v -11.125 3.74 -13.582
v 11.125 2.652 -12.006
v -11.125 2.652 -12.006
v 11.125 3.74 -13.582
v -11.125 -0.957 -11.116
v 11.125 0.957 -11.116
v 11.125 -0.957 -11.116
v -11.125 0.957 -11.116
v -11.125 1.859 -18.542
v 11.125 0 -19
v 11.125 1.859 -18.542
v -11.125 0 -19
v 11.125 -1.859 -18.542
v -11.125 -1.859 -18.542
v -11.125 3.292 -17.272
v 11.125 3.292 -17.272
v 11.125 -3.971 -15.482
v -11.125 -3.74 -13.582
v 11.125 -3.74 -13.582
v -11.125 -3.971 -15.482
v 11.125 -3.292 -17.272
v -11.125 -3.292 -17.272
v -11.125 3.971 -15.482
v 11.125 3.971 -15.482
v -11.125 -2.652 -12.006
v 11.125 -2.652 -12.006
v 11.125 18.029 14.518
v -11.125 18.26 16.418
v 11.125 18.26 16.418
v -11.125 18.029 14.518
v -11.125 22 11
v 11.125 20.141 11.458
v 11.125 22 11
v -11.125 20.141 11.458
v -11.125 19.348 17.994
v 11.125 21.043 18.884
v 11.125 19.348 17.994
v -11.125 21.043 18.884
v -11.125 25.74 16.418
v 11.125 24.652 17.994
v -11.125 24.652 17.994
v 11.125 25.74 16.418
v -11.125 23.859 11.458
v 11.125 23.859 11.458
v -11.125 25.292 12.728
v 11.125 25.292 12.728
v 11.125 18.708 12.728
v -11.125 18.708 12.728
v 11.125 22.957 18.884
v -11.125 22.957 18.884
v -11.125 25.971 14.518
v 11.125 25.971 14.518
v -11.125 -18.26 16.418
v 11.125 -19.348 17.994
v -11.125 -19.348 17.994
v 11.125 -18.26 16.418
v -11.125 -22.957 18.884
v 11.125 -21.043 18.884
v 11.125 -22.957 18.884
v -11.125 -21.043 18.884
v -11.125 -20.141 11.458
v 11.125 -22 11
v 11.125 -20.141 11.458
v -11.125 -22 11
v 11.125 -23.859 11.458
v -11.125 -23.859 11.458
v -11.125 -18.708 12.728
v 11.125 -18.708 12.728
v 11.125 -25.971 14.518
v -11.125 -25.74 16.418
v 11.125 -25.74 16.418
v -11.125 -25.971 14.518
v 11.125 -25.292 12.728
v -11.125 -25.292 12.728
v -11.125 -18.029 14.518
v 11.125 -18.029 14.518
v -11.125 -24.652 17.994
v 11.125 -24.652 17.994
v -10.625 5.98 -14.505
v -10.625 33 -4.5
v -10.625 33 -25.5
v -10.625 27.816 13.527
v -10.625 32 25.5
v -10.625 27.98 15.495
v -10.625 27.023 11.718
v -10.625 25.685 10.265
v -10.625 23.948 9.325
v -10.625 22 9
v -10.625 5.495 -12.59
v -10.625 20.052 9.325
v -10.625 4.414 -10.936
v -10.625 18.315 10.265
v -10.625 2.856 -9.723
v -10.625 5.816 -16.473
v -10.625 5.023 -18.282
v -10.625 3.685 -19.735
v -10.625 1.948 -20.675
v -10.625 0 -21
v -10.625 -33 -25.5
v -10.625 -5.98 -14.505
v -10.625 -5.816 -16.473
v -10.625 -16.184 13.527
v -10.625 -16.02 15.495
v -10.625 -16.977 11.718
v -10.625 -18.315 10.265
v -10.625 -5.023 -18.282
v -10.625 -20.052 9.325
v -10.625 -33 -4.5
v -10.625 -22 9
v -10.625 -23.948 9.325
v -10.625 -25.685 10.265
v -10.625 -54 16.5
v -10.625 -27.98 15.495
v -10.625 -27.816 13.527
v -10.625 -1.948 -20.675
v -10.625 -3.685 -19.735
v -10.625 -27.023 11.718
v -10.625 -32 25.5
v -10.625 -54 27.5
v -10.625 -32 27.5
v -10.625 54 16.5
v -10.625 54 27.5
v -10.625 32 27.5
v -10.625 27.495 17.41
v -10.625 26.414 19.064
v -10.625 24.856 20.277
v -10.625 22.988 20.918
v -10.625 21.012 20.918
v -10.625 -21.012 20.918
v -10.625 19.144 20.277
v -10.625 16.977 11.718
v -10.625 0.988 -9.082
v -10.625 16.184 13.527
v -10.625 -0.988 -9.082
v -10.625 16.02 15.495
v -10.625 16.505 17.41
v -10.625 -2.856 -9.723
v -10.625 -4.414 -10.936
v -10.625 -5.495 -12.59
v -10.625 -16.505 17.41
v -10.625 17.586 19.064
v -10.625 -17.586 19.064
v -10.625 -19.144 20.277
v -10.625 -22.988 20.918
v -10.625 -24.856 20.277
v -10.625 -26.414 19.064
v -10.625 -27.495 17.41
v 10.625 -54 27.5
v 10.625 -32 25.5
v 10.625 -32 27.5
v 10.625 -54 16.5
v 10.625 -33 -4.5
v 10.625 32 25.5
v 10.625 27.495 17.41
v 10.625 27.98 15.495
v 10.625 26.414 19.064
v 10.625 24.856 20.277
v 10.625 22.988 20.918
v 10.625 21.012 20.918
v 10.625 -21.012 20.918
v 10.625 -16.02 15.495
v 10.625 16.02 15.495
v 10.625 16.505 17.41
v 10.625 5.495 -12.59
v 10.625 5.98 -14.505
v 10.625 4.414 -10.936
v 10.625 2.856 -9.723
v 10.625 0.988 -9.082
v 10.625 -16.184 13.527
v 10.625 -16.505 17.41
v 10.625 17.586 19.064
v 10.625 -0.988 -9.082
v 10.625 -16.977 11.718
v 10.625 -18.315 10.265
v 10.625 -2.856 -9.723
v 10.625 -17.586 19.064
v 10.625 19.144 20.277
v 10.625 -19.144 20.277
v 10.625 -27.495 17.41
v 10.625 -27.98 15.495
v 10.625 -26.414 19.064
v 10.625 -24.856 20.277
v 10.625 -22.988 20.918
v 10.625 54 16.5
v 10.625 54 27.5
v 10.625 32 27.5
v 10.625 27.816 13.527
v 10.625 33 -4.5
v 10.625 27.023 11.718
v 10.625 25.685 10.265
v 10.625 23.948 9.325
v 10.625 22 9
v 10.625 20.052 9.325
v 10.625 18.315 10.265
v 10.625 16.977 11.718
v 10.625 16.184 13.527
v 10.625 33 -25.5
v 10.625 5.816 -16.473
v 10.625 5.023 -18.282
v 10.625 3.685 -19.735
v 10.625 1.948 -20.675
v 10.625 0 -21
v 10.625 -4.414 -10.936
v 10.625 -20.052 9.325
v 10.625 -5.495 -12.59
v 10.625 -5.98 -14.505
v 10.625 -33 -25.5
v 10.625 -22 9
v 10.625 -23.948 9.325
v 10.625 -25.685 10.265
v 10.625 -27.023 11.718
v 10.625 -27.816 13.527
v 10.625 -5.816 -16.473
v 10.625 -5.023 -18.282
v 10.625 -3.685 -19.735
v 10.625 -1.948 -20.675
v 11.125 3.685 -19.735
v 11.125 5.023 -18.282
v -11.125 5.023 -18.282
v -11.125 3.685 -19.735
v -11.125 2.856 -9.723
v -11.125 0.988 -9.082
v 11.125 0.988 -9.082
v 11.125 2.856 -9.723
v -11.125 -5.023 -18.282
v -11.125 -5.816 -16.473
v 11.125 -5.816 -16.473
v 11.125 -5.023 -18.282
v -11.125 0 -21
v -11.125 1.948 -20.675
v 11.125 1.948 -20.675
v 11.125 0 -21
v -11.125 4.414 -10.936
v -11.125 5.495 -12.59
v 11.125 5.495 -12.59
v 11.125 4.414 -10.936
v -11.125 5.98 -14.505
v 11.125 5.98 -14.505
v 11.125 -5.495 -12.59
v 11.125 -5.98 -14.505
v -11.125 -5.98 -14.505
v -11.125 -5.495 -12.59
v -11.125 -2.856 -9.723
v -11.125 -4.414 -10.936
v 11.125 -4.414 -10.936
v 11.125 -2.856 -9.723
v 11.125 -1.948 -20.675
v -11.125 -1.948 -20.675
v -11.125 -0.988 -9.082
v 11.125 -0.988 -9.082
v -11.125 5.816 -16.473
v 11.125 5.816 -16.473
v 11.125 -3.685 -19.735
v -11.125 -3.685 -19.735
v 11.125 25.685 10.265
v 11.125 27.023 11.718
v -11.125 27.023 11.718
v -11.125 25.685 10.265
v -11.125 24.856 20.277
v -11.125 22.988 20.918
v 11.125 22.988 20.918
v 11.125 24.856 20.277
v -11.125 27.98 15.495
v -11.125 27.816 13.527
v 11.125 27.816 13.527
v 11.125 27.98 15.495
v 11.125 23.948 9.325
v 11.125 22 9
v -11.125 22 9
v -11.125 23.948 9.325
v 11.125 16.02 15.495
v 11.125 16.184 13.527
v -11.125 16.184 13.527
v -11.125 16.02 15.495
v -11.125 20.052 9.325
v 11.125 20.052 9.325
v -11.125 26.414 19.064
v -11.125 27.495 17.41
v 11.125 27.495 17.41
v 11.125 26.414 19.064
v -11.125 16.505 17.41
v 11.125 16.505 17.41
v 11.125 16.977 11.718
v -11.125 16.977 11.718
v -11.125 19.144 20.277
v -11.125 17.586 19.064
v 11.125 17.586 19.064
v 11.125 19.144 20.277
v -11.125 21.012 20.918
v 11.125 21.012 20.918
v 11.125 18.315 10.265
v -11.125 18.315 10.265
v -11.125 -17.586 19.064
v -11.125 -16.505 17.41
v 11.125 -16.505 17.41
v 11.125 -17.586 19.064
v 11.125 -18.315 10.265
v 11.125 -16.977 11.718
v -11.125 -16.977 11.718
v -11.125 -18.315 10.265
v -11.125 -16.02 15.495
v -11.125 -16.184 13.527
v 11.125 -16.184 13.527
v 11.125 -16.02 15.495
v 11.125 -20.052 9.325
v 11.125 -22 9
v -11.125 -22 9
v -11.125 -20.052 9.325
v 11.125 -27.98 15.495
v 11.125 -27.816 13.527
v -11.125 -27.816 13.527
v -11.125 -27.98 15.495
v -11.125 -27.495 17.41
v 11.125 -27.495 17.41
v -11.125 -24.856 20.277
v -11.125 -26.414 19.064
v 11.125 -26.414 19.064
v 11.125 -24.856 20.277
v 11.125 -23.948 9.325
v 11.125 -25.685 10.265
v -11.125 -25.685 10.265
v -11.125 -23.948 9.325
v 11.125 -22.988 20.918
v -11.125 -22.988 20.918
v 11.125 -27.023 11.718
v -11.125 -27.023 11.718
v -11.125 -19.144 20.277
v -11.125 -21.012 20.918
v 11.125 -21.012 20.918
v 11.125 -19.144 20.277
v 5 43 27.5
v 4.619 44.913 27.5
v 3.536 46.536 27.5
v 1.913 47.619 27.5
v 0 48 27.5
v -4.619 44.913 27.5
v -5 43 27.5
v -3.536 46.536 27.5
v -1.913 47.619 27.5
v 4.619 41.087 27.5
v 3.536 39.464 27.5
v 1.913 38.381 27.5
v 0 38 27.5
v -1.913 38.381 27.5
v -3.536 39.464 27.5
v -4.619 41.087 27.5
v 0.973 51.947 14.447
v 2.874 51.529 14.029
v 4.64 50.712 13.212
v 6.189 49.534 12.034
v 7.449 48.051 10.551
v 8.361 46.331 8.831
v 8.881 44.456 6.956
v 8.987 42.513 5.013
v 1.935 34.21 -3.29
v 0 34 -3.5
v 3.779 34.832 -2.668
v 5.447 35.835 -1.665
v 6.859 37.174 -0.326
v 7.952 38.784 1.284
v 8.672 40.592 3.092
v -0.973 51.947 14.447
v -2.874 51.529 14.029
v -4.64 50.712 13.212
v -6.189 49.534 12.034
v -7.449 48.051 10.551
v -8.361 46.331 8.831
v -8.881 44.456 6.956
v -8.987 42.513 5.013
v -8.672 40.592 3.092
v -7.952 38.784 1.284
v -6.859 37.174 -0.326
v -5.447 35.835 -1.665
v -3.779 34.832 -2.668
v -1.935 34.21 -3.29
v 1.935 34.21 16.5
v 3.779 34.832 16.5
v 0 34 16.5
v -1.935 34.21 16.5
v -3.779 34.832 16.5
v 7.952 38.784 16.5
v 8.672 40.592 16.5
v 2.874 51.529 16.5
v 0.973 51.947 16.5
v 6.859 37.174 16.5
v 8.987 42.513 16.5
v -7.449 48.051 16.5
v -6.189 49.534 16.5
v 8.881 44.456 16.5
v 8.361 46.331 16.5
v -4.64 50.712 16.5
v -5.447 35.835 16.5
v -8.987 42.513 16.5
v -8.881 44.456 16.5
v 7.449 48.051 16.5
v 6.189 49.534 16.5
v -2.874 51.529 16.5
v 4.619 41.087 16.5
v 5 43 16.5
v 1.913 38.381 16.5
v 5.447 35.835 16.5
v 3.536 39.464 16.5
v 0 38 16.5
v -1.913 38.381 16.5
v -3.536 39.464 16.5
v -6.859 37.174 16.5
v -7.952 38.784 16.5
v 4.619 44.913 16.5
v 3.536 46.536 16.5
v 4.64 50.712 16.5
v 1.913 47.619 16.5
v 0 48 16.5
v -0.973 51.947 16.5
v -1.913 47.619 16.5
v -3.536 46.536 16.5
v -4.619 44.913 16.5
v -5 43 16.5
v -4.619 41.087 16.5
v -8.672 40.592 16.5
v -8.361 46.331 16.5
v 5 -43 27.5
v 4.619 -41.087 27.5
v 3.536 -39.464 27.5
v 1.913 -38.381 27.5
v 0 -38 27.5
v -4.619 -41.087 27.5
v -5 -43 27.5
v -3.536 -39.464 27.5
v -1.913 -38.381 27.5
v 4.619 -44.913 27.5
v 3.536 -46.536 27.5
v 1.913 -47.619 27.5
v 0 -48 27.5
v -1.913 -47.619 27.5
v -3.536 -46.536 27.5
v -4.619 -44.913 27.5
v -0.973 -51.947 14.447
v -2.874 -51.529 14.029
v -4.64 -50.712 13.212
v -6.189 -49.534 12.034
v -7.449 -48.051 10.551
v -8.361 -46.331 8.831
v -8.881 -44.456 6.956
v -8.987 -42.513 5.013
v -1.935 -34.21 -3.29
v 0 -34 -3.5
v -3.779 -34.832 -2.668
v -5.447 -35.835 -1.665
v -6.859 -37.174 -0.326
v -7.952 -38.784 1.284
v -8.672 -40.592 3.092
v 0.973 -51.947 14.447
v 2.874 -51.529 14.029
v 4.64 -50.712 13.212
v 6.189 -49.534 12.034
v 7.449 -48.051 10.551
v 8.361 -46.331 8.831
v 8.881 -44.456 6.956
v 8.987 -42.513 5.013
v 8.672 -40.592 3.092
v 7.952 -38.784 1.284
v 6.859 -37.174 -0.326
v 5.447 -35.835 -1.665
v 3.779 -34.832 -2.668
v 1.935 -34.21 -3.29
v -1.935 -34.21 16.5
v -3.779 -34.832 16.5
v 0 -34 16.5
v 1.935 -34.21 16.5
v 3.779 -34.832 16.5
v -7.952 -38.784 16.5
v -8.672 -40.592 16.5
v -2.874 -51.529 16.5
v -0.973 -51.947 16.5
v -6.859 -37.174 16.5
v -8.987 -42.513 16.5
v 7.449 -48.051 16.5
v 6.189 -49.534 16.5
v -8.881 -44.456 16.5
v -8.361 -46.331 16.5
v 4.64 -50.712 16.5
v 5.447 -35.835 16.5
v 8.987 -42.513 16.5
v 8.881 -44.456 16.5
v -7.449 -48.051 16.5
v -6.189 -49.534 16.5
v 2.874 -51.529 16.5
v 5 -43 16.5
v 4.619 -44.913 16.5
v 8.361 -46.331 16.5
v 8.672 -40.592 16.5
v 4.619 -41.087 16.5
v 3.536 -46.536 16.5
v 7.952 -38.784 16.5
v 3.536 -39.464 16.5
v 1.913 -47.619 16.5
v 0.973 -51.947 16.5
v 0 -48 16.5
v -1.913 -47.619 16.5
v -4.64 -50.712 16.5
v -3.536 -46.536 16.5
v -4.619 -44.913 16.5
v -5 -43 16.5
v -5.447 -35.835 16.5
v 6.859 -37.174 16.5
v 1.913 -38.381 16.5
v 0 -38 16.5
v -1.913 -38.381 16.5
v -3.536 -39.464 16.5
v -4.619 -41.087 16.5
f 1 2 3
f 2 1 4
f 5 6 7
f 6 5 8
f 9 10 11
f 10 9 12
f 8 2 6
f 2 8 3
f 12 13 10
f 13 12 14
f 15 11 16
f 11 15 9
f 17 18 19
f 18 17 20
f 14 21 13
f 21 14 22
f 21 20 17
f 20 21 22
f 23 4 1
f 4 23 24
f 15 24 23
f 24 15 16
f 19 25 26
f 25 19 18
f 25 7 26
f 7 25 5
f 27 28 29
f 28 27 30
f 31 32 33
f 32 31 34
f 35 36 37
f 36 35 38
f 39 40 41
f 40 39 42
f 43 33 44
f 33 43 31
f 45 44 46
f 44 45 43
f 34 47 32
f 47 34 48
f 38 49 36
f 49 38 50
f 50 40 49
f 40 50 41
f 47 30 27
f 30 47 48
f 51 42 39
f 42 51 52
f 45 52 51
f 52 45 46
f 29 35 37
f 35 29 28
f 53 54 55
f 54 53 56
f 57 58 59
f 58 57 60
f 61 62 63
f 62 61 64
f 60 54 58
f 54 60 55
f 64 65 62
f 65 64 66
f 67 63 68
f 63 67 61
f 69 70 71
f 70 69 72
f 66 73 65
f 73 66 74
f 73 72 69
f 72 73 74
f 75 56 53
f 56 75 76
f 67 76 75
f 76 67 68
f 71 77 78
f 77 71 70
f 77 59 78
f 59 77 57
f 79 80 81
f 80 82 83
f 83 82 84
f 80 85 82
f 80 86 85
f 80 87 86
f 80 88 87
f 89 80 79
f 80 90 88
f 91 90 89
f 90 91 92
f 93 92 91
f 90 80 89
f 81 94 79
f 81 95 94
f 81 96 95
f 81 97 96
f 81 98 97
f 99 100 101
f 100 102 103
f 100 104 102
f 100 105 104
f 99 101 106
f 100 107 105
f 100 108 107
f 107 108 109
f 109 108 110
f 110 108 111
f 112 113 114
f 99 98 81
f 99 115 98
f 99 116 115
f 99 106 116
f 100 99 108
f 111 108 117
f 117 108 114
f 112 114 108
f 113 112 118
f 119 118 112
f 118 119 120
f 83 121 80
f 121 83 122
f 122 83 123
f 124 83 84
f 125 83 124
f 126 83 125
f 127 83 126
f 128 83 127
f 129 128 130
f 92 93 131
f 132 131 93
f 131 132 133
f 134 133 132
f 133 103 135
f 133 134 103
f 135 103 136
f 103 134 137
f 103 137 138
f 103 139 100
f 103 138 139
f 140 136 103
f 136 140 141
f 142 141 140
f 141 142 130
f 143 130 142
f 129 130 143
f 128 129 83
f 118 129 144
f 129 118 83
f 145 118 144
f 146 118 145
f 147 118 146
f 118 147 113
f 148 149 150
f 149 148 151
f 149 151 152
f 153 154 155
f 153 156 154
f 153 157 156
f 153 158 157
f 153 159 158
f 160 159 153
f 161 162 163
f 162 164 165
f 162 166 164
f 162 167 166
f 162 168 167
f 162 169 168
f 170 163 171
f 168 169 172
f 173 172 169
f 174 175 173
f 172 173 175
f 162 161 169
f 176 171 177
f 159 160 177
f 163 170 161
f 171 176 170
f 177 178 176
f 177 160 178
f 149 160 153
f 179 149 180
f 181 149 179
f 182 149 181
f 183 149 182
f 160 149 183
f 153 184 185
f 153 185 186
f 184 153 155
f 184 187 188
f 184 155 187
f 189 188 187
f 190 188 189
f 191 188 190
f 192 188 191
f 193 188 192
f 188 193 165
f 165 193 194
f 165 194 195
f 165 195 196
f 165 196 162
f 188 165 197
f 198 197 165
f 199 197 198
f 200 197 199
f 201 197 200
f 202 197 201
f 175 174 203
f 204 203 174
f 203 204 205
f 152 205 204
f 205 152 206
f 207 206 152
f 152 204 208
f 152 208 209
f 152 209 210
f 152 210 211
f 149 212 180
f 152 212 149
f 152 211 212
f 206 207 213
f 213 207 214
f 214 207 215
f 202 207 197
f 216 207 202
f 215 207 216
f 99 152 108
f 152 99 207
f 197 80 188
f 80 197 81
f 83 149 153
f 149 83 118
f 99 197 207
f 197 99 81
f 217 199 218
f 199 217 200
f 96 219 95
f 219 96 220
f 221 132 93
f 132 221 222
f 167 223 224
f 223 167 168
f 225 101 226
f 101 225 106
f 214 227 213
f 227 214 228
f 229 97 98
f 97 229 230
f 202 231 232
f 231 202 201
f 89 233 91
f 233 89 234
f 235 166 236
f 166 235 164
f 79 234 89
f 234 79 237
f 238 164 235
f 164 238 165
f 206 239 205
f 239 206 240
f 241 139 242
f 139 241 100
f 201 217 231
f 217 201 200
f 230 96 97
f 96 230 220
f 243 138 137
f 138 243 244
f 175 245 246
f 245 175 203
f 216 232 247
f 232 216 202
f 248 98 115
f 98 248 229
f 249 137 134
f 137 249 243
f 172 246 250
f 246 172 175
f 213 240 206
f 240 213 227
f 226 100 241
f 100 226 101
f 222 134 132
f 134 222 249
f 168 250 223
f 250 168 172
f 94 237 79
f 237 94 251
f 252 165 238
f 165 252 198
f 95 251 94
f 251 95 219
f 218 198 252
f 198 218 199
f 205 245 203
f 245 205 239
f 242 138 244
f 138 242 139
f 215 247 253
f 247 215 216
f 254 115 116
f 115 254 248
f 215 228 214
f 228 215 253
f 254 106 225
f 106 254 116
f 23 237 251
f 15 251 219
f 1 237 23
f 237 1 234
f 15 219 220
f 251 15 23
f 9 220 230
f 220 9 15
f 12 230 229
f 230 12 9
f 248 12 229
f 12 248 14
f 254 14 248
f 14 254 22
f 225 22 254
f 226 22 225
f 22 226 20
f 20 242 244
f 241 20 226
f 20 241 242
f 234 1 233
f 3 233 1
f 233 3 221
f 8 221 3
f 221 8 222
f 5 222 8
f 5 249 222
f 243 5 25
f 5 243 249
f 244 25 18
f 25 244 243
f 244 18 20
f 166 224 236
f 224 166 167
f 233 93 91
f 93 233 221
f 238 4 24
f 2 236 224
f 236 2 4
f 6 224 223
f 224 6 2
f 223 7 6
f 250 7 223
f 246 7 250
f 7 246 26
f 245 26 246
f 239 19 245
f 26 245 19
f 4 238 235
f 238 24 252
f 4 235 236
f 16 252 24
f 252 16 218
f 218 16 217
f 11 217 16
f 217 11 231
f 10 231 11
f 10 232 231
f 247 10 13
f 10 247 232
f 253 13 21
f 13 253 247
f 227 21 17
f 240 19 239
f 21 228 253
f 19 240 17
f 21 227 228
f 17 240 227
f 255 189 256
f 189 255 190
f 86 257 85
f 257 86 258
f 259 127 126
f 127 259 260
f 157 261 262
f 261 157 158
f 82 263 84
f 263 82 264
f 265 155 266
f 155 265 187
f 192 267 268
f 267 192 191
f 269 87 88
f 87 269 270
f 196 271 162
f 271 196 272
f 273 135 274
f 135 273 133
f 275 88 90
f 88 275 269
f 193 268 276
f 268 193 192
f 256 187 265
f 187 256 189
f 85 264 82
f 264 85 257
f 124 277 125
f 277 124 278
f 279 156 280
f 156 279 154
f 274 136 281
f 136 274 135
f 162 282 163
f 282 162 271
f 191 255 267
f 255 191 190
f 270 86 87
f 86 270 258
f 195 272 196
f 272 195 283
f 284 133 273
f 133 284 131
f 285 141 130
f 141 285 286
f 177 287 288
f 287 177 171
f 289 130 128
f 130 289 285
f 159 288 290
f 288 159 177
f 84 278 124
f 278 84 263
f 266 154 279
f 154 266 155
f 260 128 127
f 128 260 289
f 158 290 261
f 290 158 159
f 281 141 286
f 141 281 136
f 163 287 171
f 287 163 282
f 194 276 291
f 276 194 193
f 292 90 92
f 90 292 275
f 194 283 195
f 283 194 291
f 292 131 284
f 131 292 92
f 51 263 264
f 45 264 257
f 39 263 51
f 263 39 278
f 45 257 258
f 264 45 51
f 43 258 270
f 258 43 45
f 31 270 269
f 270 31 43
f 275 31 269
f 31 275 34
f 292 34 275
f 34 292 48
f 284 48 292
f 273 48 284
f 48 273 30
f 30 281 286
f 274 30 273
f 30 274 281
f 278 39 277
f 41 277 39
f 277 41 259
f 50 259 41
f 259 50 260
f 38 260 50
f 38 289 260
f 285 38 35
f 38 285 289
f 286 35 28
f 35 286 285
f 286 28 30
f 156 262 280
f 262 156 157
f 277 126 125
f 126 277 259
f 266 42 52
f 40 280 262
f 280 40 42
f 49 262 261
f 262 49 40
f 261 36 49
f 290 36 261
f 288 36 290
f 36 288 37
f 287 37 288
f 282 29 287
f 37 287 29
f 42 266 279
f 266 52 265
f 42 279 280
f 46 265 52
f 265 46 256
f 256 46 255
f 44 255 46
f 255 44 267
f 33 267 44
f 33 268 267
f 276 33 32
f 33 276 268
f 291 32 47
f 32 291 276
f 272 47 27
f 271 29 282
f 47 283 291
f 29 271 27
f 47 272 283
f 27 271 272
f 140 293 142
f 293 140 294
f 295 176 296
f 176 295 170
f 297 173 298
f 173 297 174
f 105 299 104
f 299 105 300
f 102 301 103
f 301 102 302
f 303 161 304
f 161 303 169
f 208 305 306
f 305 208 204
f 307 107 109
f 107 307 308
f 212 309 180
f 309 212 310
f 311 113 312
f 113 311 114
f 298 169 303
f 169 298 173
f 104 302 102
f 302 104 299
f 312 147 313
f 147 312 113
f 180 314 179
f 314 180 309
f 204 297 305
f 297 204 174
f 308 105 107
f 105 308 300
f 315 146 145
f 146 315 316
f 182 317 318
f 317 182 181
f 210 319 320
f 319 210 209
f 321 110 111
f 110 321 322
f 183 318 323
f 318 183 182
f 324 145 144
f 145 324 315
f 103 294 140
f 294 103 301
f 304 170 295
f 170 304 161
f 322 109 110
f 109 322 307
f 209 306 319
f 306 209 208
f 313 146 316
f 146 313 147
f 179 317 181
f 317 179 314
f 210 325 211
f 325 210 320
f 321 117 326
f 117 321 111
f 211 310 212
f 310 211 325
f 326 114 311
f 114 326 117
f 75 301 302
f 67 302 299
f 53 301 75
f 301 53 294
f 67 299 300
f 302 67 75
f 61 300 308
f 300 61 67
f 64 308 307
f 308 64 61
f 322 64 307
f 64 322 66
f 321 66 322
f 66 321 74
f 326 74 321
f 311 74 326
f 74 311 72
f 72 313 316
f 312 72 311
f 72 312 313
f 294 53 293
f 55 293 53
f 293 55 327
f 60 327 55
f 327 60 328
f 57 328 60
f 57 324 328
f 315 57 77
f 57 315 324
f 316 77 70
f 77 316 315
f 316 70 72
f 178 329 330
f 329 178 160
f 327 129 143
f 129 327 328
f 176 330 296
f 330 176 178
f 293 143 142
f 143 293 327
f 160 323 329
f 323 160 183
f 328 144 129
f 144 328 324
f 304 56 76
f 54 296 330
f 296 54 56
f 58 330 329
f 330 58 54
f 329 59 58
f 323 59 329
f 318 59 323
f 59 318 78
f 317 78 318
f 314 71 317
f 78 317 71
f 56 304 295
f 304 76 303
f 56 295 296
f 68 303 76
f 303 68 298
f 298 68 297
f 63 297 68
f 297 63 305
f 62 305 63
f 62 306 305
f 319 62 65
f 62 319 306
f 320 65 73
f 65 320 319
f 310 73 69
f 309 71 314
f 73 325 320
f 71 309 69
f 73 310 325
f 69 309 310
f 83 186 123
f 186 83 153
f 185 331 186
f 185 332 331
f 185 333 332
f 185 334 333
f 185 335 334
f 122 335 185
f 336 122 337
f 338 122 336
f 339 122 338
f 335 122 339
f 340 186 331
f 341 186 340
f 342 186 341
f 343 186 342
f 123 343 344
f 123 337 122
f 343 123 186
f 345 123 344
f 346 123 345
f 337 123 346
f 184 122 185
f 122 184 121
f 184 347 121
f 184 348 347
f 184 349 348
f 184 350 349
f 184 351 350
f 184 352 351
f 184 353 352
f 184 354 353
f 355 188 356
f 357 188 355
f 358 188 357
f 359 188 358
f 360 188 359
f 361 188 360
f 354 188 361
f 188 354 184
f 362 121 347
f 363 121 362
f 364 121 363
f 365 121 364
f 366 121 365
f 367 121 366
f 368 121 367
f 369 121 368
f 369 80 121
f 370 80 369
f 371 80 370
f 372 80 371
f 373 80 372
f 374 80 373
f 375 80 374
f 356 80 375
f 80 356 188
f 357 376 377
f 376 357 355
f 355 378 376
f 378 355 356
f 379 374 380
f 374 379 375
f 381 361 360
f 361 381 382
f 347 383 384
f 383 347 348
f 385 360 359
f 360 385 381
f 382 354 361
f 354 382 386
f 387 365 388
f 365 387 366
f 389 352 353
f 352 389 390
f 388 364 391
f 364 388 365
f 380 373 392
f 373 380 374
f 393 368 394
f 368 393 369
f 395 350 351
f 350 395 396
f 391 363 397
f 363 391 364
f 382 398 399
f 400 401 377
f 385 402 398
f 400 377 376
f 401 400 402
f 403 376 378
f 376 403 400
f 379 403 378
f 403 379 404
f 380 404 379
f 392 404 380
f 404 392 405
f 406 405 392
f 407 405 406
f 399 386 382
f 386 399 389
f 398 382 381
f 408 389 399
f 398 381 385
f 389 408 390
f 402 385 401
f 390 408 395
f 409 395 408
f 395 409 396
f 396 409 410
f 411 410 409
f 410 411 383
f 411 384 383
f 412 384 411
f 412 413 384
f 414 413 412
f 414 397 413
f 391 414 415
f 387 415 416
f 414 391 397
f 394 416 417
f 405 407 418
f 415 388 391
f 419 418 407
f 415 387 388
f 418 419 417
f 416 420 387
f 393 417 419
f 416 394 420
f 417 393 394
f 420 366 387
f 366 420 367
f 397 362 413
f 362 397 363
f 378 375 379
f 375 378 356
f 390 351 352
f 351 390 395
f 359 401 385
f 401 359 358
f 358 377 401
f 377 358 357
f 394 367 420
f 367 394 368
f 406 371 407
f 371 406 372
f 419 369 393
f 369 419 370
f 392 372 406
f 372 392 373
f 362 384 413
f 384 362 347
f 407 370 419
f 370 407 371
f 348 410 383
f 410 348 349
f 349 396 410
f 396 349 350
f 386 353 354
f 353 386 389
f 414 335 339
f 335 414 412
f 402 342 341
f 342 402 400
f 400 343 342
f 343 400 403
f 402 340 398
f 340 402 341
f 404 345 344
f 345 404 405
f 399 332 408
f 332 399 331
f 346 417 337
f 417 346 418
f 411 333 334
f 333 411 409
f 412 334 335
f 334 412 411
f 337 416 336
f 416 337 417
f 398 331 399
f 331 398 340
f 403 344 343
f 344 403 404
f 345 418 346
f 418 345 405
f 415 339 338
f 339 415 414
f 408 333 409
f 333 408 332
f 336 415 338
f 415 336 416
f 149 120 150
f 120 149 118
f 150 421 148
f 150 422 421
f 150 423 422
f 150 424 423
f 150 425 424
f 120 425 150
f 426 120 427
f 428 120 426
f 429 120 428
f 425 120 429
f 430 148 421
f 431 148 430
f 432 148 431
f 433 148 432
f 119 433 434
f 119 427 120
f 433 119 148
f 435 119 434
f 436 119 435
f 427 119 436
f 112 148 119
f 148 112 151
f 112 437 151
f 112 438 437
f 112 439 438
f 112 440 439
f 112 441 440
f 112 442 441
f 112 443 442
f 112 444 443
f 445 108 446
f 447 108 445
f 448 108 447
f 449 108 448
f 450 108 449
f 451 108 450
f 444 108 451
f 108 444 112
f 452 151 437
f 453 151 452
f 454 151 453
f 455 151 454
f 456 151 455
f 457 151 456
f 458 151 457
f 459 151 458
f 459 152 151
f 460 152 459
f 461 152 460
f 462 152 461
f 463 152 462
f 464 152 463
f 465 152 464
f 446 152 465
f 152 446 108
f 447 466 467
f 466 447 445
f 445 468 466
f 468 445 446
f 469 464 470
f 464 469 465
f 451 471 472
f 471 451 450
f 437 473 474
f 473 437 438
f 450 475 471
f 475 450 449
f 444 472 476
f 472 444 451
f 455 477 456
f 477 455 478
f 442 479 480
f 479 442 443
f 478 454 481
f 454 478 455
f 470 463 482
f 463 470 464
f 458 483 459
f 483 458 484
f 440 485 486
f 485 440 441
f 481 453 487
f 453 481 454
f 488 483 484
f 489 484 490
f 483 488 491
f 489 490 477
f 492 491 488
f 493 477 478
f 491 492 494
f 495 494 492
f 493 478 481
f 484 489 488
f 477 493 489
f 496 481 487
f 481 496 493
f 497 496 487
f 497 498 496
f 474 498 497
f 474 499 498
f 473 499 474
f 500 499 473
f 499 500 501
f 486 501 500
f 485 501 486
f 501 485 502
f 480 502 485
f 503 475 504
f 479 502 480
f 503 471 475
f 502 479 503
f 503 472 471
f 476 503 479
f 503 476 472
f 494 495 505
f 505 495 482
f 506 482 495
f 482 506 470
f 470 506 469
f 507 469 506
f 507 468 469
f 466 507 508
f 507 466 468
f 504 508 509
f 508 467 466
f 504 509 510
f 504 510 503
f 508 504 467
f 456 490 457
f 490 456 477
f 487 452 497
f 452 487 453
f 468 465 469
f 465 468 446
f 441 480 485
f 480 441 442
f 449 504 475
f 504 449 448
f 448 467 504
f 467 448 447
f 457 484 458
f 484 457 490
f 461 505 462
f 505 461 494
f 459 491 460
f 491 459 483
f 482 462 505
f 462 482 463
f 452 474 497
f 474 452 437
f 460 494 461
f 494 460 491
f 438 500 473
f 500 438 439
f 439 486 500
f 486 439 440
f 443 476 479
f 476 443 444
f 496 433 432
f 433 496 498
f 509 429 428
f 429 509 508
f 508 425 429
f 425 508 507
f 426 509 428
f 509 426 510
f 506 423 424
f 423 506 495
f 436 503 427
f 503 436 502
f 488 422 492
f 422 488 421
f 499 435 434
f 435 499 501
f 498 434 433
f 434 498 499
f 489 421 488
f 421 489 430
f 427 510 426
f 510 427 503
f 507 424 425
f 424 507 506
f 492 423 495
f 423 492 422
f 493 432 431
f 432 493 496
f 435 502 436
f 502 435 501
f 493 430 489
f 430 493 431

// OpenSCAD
// file: bearing.scad
module bearing(shaftSize = 8, outerDiameter = 22, height = 8){
    shaftRadius = shaftSize / 2;
    outerRadius = outerDiameter / 2;
  union(){
    color([100 / 255, 100 / 255, 100 / 255]){
      difference(){
        cylinder(r = outerRadius - 1, h = height - 1, center = true);
        cylinder(r = shaftRadius + 1, h = height, center = true);
      }
    }
    color([200 / 255, 200 / 255, 200 / 255]){

      difference(){
        cylinder(r = outerRadius, h = height, center = true);
        cylinder(r = outerRadius - 2, h = height + 1, center = true);
      }
      difference(){
        cylinder(r = shaftRadius + 2, h = height, center = true);
        cylinder(r = shaftRadius, h = height + 1, center = true);
      }
    }

  }
}
// main file
include<bearing.scad>

module bearings(railTineHeight = 7, bearingDiam = 22, bearingHeight = 8, bearingShaftSize = 8){
  translate([0, bearingDiam / 2 + railTineHeight / 2, bearingDiam]){
    rotate([0, 90, 0]){
      bearing(bearingShaftSize, bearingDiam, bearingHeight);
    }
  }
  translate([0, bearingDiam / 2 + railTineHeight / 2, -bearingDiam]){
    rotate([0, 90, 0]){
      bearing(bearingShaftSize, bearingDiam, bearingHeight);
    }
  }
  translate([0, -bearingHeight - railTineHeight, 0]){
    rotate([0, 90, 0]){
      bearing(bearingShaftSize, bearingDiam, bearingHeight);
    }
  }
}

module boltHoles(railGapW = 21.25, bearingDiam = 22, bearingShaftSize = 8){
  translate([0, 0, -(bearingDiam / 2 + bearingShaftSize / 2)]){
    rotate([0, 90, 0]){
      cylinder(r = bearingShaftSize / 2, h = railGapW + 2, center = true);
    }
  }
  translate([0, bearingDiam, (bearingDiam / 2 + bearingShaftSize / 2)]){
    rotate([0, 90, 0]){
      cylinder(r = bearingShaftSize / 2, h = railGapW + 2, center = true);
    }
  }
  translate([0, -bearingDiam, (bearingDiam / 2 + bearingShaftSize / 2)]){
    rotate([0, 90, 0]){
      cylinder(r = bearingShaftSize / 2, h = railGapW + 2, center = true);
    }
  }
}

module bearingSupports(railGapW = 21.25, bearingDiam = 22, bearingShaftSize = 8){
  difference(){
    translate([0, 0, 0]){
      translate([0, 0, -(bearingDiam / 2 + bearingShaftSize / 2)]){
        rotate([0, 90, 0]){
          cylinder(r = bearingShaftSize / 2 + 2, h = railGapW + 1, center = true);
        }
      }
      translate([0, bearingDiam, (bearingDiam / 2 + bearingShaftSize / 2)]){
        rotate([0, 90, 0]){
          cylinder(r = bearingShaftSize / 2 + 2, h = railGapW + 1, center = true);
        }
      }
      translate([0, -bearingDiam, (bearingDiam / 2 + bearingShaftSize / 2)]){
        rotate([0, 90, 0]){
          cylinder(r = bearingShaftSize / 2 + 2, h = railGapW + 1, center = true);
        }
      }
    }
    boltHoles(railGapW, bearingDiam, bearingShaftSize);

  }
}

module sliderBracket(railGapW = 21.25, bearingDiam = 22){
  translate([-railGapW / 2, 0, 0]){
    rotate([90, 180, 90]){
      difference(){
        difference(){
          linear_extrude(railGapW){
            polygon([
                [-bearingDiam / 2, 0],
                [-bearingDiam / 2, -bearingDiam / 2],
                [bearingDiam / 2, -bearingDiam / 2],
                [bearingDiam / 2, bearingDiam]
              ]);
          }
          translate([0, 10, railGapW / 2]){
            rotate([90, 0, 0]){
              cylinder(r = 9, h = 20, center = true);
            }
          }
        }
        translate([0, 0, railGapW / 2]){
          rotate([90, 0, 0]){
            cylinder(r = 5, h = 50, center = true);
          }
        }
      }
    }
  }
}

module slider(railGapW = 21.25, railTineHeight = 7, bearingDiam = 22, bearingHeight = 8, bearingShaftSize = 8){

  color([60 / 255, 60 / 255, 60 / 255]){
    union(){
      union(){
        difference(){
          rotate([90, 0, 0]){
            cube(size = [railGapW, railTineHeight + bearingDiam * 2, bearingDiam * 3], center = true);
          }

          boltHoles(railGapW, bearingDiam, bearingShaftSize);
        }

        bearingSupports();
      }

      translate([0, 0, 0]){
        translate([0, 2 * bearingDiam - 1, 0.75 * bearingDiam]){
          sliderBracket();
        }
        translate([0, -2 * bearingDiam + 1, 0.75 * bearingDiam]){
          rotate([0, 0, 180]){
            sliderBracket();
          }
        }
      }
    }
  }
}
slider();
